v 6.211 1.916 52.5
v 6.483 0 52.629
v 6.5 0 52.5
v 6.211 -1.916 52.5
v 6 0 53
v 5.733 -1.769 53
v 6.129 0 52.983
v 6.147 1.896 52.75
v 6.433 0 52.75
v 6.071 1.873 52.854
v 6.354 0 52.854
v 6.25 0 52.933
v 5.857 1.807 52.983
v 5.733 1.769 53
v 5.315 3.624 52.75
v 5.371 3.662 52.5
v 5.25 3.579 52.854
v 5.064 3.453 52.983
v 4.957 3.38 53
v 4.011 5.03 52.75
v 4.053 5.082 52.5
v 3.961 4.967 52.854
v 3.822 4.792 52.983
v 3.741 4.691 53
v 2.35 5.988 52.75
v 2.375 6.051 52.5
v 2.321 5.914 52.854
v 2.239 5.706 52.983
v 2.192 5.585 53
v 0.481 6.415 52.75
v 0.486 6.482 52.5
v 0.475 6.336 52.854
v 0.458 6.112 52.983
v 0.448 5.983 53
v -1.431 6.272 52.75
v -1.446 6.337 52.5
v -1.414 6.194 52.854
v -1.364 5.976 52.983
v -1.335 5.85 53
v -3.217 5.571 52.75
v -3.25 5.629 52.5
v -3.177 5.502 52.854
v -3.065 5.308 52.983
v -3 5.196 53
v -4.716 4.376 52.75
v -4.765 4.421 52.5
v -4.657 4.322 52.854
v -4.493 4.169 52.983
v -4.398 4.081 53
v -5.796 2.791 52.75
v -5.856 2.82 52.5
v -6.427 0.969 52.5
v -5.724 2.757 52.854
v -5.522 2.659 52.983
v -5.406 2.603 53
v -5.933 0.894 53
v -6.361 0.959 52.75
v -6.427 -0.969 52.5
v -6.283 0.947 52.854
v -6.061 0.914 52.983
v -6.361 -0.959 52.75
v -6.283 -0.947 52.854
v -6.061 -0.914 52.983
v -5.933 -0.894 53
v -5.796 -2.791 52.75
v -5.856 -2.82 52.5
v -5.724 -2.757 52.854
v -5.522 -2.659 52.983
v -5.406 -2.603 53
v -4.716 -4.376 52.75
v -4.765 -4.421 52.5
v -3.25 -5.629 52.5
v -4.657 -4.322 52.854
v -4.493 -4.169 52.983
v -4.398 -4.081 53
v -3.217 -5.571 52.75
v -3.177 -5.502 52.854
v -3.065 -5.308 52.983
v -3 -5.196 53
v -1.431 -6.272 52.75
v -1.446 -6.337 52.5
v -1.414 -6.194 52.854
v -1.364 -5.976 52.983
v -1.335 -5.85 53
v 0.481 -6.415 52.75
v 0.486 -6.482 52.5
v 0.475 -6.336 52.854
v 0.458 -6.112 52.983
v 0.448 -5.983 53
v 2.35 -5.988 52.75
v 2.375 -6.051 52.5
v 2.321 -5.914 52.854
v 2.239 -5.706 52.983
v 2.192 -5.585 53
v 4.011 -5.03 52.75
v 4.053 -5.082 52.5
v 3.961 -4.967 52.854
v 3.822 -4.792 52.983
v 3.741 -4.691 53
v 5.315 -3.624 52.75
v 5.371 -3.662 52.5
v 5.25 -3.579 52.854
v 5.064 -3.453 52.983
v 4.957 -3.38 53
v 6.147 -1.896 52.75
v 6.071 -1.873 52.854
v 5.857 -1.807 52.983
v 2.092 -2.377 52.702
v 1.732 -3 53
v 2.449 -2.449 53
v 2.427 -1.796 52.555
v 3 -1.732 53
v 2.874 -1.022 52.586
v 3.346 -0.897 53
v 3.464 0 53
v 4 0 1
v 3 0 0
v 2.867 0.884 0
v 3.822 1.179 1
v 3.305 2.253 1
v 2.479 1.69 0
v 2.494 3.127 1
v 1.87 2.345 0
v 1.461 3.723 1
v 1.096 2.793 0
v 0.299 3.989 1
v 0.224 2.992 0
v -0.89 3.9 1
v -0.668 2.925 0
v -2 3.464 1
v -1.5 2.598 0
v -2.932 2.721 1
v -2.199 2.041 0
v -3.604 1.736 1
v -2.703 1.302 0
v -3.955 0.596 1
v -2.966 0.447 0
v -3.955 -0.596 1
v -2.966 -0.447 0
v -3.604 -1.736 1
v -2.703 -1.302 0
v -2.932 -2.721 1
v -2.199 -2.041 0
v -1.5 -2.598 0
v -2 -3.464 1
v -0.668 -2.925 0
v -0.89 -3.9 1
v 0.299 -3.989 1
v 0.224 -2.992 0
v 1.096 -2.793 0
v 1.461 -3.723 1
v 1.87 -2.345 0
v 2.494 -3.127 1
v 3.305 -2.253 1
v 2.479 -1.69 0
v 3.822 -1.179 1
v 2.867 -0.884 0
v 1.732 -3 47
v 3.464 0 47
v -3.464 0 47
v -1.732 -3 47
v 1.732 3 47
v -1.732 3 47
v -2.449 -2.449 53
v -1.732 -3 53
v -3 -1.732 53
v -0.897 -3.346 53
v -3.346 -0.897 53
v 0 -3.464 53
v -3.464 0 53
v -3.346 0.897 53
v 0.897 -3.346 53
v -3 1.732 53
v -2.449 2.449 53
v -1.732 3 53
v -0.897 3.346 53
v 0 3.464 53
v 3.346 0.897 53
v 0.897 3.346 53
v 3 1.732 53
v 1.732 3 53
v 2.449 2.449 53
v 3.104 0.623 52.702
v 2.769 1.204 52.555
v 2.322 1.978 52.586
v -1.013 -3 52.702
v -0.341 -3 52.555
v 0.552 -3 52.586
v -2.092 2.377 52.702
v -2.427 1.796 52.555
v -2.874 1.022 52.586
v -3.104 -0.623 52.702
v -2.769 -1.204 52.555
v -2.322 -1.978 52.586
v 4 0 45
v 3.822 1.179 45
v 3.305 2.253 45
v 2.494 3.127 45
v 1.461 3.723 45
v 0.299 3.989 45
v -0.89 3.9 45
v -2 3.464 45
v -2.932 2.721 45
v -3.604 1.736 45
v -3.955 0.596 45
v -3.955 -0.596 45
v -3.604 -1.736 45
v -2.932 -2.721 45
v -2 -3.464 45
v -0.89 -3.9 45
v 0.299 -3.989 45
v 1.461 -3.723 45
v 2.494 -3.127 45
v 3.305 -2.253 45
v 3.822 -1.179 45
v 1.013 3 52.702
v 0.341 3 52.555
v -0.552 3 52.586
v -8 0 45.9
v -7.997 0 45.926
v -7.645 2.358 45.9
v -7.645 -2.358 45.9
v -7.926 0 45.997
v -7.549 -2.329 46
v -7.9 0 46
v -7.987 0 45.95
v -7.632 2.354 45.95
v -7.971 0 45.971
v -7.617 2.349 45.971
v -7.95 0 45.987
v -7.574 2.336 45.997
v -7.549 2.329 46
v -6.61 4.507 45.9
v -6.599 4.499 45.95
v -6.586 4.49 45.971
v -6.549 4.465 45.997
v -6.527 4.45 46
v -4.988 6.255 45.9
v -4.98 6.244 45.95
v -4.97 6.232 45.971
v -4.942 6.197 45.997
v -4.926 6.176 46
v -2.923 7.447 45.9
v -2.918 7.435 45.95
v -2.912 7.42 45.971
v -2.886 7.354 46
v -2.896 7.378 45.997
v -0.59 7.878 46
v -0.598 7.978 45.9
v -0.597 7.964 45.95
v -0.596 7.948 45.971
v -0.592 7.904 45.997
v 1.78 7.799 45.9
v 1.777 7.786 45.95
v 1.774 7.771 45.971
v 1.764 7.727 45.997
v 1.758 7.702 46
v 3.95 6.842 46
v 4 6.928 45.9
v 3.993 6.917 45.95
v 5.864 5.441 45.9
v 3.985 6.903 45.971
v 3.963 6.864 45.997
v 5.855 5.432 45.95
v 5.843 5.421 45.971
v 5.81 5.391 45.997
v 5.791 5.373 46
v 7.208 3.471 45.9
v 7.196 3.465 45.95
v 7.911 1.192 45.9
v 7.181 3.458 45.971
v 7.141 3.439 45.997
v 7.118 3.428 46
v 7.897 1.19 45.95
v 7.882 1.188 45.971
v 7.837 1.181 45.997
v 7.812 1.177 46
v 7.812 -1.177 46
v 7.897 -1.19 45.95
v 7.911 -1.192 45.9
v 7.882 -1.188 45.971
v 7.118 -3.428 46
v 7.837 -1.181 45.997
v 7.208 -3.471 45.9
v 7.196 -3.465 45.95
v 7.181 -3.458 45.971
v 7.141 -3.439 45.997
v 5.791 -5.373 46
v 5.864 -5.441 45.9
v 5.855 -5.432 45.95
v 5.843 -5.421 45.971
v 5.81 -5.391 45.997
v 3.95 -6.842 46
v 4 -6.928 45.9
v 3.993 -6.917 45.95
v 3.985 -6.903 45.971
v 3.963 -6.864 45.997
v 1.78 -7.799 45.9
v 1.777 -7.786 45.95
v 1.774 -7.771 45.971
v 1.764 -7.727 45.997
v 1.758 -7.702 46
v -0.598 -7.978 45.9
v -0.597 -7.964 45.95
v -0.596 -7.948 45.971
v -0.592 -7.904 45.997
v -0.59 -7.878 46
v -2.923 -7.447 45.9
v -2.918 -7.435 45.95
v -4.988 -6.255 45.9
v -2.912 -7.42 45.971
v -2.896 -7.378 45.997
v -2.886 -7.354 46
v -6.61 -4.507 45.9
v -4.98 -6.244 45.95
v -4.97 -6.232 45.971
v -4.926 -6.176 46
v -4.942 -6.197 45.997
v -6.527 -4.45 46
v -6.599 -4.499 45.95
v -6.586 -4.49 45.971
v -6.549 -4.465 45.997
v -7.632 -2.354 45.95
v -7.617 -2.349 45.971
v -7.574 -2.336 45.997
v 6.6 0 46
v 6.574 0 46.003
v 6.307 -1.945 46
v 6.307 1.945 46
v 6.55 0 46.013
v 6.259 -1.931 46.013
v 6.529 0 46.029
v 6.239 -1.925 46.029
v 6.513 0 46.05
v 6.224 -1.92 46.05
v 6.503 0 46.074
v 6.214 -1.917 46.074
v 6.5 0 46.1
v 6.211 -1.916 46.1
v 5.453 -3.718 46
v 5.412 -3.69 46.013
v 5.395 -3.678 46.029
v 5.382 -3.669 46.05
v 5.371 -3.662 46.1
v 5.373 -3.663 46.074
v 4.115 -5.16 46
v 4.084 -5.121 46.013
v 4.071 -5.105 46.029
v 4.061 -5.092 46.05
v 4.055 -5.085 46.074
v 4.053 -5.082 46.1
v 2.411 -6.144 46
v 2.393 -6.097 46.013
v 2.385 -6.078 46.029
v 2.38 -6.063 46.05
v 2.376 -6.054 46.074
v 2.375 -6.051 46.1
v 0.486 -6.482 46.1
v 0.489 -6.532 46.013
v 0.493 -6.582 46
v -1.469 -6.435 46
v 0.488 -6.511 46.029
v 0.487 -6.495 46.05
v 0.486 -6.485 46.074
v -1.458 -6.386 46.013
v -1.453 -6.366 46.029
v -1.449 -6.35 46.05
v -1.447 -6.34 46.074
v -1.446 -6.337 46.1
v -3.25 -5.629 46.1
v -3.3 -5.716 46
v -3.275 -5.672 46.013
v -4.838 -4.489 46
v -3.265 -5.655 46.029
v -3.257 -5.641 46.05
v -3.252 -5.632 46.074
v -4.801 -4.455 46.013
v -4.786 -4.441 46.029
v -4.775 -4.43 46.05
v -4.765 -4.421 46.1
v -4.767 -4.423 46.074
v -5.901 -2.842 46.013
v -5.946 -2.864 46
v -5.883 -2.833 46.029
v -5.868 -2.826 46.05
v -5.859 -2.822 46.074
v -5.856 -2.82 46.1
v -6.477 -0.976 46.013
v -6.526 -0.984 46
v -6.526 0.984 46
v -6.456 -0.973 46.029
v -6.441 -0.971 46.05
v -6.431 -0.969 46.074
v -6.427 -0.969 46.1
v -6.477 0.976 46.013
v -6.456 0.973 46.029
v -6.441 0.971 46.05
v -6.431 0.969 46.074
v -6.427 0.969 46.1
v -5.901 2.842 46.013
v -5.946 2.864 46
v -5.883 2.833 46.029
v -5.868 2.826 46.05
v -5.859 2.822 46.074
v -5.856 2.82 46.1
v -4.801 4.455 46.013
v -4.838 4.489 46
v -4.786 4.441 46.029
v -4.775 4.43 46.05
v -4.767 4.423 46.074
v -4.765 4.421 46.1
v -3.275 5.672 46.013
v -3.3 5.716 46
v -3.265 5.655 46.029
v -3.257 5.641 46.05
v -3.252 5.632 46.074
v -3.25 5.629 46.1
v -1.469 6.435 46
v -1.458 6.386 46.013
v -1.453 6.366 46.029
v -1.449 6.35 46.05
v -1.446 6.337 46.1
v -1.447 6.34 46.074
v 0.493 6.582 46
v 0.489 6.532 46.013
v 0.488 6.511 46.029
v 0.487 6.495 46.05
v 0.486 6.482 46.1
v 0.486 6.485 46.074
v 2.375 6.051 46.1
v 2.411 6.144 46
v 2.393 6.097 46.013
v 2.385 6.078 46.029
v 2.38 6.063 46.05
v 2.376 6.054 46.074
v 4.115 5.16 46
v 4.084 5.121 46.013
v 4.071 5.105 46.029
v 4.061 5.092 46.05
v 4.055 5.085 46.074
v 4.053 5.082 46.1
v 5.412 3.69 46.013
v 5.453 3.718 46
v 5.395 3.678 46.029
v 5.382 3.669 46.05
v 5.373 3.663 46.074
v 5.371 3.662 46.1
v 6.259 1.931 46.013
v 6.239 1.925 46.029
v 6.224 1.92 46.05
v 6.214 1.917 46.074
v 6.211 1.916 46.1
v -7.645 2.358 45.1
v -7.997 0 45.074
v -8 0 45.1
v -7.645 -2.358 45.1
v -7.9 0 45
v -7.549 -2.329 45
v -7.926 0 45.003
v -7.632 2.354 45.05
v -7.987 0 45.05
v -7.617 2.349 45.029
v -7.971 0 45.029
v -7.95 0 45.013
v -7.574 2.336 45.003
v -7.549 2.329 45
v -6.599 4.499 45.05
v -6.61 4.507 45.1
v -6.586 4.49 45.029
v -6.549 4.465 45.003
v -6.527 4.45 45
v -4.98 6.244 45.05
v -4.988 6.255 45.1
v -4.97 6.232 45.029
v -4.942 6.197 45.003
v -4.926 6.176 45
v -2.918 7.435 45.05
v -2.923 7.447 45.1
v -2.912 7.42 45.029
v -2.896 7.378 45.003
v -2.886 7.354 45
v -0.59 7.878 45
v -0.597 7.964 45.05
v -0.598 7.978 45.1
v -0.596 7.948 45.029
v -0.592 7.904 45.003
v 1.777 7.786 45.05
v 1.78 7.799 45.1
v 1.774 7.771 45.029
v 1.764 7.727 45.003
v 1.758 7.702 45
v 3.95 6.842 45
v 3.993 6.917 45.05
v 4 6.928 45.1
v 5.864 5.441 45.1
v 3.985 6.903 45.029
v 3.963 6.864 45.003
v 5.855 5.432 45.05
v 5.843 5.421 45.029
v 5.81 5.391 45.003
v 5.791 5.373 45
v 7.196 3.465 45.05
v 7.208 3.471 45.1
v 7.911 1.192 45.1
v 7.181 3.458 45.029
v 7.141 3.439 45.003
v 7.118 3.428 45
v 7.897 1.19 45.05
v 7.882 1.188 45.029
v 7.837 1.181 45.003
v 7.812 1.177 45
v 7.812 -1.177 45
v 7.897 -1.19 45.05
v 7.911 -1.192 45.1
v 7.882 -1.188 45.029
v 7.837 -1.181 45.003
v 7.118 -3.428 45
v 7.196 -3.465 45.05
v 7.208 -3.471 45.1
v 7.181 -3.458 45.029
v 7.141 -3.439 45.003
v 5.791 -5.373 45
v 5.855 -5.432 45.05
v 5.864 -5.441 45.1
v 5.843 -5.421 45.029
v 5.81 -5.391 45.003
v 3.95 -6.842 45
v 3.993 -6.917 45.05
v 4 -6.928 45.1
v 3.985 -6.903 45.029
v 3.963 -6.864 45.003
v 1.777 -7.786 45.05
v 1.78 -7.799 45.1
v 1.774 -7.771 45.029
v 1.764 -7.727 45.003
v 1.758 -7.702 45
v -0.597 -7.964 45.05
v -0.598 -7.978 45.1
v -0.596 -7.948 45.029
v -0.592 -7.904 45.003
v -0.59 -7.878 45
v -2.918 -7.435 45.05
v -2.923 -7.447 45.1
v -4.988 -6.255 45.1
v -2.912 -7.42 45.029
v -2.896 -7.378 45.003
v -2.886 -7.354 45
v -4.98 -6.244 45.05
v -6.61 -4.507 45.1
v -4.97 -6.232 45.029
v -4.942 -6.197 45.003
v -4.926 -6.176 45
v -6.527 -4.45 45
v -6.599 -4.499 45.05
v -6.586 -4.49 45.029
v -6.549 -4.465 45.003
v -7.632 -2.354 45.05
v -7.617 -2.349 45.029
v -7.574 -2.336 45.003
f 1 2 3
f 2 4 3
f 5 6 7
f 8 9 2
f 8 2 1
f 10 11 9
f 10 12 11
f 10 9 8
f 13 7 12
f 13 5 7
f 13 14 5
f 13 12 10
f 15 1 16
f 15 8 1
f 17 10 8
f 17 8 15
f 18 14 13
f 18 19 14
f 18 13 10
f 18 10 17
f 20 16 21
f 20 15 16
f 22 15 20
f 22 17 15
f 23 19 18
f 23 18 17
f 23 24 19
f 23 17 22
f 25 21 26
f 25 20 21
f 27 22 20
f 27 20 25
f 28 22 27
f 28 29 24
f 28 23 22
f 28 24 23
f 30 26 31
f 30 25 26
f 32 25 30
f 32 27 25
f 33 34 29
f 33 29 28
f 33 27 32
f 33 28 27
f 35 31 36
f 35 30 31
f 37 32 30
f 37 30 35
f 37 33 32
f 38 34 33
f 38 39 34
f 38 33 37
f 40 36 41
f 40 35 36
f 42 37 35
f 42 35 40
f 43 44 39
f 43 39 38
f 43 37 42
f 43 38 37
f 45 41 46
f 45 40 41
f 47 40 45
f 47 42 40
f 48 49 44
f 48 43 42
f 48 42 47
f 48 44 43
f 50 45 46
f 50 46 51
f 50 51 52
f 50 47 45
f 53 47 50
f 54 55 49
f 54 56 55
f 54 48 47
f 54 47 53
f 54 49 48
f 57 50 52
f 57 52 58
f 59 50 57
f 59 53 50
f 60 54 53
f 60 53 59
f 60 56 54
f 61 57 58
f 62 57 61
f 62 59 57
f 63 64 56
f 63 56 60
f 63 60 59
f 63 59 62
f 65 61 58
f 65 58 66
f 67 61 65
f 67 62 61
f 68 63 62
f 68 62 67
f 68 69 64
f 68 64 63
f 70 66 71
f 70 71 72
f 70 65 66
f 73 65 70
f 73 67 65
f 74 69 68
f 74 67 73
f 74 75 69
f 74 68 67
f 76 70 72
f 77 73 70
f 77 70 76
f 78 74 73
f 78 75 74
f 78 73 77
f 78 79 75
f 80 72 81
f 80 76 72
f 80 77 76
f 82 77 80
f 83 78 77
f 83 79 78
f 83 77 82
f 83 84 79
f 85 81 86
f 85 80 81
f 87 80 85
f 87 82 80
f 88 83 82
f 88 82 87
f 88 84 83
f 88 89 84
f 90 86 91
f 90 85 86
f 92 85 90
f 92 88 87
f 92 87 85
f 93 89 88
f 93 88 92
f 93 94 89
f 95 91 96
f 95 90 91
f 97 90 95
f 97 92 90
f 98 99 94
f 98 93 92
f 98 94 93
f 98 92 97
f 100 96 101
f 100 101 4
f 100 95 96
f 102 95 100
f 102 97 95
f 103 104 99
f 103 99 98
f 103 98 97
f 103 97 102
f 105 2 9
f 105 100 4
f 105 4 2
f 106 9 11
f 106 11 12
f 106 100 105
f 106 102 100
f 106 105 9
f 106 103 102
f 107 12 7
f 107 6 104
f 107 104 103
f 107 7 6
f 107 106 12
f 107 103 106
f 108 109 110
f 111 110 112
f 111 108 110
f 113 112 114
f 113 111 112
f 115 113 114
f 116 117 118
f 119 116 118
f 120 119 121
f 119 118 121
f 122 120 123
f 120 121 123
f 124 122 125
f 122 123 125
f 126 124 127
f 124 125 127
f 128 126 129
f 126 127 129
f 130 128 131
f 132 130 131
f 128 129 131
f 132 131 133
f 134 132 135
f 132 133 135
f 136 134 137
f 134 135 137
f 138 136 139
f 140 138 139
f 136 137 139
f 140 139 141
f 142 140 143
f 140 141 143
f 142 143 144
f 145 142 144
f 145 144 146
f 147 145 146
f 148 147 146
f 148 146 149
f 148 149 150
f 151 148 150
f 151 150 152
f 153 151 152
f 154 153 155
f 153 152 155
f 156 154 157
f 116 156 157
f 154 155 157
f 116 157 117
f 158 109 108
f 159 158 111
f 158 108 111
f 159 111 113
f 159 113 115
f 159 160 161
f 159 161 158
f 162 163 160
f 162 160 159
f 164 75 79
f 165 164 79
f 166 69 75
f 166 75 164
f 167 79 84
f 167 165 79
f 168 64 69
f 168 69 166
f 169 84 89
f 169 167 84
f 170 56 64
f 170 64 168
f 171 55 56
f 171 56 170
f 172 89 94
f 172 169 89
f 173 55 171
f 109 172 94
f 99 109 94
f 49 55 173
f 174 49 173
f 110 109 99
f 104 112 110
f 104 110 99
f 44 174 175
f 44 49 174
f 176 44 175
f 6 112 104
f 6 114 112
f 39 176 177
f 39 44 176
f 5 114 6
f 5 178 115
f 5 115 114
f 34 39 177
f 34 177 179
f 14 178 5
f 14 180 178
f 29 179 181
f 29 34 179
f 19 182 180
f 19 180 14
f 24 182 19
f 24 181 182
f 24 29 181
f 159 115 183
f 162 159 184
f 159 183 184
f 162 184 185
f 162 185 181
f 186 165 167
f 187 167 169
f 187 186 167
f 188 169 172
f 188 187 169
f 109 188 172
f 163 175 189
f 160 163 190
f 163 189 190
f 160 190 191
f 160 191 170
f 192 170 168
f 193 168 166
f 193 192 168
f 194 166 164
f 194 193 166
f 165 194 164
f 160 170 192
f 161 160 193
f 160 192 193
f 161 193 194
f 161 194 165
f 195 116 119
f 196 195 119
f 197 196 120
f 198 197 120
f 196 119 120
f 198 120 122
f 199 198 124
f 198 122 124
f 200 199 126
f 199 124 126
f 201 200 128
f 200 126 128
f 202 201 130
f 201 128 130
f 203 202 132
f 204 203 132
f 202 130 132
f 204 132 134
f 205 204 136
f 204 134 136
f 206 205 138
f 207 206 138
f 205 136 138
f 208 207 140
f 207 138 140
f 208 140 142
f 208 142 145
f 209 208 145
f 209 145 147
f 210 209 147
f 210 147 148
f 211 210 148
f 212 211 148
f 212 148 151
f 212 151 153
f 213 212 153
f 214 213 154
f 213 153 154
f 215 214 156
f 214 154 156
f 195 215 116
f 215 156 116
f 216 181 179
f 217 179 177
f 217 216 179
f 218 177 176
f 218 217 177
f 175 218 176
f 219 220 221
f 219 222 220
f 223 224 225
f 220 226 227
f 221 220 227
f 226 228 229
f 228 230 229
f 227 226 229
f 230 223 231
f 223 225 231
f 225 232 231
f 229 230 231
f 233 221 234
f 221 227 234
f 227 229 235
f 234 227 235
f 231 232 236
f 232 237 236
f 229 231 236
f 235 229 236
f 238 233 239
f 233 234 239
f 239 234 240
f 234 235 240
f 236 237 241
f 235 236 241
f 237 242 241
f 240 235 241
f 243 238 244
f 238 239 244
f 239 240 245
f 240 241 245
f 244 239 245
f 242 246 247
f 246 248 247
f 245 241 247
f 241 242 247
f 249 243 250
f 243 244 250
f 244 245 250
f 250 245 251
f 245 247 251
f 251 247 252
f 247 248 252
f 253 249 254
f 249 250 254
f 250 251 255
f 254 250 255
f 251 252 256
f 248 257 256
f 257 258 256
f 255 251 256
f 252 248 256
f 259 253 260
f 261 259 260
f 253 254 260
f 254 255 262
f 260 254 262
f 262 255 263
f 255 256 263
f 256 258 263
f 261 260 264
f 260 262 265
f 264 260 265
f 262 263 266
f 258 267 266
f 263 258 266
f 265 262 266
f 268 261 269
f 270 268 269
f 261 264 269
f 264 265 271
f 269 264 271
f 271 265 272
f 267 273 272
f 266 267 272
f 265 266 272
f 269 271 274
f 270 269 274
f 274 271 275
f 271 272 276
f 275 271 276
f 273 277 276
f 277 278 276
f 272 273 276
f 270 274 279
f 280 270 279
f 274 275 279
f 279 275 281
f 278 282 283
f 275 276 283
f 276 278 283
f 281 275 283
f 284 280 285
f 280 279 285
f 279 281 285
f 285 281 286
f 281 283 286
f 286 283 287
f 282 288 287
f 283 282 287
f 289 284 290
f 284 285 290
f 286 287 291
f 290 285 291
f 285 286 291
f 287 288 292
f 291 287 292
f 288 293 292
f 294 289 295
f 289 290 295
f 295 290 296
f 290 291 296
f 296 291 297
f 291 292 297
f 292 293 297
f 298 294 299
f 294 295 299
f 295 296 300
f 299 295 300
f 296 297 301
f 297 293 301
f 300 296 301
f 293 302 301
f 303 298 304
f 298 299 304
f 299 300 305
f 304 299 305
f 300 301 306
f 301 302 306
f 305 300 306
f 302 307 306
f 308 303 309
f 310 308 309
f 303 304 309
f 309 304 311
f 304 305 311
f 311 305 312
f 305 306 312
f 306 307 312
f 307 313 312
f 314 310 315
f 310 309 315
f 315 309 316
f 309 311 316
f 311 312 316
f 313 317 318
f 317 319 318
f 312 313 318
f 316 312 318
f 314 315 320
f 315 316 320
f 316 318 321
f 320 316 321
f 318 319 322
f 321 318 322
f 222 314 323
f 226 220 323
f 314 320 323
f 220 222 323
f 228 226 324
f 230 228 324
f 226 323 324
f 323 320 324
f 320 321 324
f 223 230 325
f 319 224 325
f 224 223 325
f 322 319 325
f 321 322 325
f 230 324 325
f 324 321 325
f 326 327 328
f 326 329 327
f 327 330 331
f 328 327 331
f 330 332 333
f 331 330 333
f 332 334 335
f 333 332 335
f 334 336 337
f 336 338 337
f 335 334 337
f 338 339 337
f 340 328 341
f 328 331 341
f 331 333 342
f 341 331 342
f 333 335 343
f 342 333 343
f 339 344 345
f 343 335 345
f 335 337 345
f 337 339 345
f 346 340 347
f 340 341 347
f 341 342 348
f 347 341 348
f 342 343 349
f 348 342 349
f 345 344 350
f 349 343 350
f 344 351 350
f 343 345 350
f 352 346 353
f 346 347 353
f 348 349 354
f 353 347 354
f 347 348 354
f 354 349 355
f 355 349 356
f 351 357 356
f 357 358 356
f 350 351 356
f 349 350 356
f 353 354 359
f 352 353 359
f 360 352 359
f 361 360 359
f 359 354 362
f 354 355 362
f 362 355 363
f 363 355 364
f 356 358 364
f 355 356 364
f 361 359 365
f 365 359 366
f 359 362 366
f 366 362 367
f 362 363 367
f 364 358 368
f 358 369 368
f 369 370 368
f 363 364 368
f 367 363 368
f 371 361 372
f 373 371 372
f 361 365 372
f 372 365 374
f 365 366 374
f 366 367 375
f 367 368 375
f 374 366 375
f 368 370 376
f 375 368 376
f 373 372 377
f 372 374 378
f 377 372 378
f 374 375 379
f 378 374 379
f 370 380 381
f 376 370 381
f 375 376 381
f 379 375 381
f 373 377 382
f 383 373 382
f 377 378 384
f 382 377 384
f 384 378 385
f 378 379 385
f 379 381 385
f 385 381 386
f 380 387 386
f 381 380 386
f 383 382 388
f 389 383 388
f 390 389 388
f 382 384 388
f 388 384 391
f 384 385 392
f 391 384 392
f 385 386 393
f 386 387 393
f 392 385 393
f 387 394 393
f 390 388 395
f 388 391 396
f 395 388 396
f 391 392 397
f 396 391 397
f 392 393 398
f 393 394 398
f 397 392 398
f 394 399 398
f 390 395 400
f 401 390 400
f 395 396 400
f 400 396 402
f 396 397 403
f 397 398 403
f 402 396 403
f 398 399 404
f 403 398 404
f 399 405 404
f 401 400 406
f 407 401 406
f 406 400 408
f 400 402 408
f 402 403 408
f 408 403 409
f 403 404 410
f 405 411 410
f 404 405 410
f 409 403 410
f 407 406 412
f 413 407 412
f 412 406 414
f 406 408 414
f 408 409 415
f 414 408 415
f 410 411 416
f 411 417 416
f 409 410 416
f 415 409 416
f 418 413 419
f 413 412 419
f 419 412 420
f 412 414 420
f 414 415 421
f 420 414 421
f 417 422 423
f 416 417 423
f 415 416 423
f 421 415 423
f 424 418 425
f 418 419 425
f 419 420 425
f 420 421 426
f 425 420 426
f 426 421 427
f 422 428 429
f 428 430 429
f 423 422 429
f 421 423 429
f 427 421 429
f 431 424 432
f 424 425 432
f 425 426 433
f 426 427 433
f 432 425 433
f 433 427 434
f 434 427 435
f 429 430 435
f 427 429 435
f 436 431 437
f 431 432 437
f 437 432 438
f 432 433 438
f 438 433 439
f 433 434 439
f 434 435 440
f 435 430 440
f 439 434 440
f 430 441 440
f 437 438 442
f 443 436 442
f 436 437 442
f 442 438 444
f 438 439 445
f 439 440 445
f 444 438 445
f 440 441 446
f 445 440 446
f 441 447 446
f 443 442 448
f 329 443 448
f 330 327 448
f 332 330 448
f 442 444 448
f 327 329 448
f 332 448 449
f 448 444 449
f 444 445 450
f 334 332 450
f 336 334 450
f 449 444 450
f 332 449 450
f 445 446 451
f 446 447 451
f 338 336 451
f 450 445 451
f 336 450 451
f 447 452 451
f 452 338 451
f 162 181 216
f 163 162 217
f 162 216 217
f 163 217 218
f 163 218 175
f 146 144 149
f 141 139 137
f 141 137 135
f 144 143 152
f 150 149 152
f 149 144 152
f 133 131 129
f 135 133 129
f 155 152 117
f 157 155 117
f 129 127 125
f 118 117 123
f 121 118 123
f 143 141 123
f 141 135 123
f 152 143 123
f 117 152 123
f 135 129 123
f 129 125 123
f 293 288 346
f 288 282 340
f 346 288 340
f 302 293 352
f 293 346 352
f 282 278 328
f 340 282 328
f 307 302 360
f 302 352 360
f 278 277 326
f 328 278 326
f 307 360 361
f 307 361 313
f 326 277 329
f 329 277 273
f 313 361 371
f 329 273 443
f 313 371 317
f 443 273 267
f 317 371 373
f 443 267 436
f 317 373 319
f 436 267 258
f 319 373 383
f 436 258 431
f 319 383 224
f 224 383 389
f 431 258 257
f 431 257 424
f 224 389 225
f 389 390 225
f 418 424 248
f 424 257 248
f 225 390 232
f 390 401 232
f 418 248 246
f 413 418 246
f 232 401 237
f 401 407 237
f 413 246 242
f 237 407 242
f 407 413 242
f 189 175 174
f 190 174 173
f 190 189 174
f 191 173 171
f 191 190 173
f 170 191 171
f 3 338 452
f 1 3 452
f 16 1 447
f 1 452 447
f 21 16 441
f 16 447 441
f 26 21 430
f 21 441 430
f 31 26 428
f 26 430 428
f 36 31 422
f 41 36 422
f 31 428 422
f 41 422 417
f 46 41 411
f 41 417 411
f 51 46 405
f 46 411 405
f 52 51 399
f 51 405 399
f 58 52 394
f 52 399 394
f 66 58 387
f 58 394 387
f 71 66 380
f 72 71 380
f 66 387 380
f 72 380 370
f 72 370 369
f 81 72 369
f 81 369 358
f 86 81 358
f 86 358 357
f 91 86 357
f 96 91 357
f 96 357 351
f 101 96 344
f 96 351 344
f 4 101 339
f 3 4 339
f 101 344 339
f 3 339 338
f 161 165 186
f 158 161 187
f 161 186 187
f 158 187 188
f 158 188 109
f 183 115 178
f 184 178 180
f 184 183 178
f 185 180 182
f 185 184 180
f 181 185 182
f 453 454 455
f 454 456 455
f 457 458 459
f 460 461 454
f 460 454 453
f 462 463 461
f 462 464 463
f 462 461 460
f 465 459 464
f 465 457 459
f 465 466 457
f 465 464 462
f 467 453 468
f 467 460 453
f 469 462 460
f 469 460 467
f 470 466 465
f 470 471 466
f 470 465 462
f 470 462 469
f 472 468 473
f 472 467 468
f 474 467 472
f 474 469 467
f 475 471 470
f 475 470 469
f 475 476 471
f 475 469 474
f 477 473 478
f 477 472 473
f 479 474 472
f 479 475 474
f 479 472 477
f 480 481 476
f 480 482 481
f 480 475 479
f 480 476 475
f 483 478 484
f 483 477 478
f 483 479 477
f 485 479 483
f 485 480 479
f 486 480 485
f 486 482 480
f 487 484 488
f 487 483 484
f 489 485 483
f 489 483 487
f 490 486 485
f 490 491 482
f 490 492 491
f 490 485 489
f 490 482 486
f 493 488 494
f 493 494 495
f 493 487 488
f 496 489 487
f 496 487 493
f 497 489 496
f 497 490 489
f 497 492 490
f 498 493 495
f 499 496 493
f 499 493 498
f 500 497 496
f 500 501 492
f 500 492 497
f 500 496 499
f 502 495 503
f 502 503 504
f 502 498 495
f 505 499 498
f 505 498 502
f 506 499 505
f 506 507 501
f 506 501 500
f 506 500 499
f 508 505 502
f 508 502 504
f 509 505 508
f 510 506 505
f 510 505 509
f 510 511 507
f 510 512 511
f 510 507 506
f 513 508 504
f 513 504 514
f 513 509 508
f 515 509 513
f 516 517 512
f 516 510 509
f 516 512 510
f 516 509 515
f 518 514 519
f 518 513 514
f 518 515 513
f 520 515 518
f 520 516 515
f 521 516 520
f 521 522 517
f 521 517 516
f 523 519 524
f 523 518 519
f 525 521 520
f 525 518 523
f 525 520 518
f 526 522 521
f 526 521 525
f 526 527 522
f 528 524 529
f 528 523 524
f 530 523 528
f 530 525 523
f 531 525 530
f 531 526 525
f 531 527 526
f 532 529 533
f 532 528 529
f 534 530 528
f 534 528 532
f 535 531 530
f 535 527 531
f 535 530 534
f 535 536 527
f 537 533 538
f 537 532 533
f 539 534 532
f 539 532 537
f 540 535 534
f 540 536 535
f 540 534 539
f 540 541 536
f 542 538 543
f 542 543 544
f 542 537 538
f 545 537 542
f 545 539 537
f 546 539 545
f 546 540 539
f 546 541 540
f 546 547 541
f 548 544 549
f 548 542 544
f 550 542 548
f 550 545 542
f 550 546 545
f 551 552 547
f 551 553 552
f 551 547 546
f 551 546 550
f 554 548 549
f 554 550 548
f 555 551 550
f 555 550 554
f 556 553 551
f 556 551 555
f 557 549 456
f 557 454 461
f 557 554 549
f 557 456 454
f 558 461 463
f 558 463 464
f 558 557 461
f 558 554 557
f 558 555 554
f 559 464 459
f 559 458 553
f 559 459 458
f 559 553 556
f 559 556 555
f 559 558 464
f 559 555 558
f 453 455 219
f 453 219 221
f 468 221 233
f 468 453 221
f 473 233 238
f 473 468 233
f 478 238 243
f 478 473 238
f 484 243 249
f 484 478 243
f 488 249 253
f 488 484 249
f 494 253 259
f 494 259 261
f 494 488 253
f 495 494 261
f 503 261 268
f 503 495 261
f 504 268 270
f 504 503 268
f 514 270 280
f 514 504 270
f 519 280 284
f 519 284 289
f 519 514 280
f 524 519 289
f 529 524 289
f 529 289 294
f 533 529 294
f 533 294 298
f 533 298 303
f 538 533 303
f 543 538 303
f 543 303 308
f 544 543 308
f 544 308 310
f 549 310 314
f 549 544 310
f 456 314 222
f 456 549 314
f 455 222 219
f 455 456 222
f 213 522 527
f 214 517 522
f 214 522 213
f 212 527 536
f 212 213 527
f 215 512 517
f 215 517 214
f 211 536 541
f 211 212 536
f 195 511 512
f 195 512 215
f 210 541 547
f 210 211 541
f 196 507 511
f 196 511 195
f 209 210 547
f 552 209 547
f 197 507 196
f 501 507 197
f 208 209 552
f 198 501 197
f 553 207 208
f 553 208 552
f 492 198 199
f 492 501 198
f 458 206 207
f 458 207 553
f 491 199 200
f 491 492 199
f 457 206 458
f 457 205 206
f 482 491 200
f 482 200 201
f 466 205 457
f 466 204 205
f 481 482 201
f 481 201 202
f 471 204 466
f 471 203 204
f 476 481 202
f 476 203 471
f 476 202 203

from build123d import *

# Parameters (mm, degrees)
SCHIZZO1_R                   = 4
ESTRUSIONE_ESTRUSIONE1_DEPTH = 45
SMUSSO1_SIZE                 = 1
SCHIZZO6_R                   = 6.5
ESTRUSIONE_ESTRUSIONE3_DEPTH = 8
TAGLIO_ESTRUSIONE3_DEPTH     = 6
SCHIZZO8_R                   = 3.464101615
TAGLIO_ESTRUSIONE4_DEPTH     = 1
TAGLIO_ESTRUSIONE4_TAPER     = 45
RACCORDO1_R                  = 0.5
SCHIZZO9_R                   = 8
SCHIZZO9_R_2                 = 6.5
ESTRUSIONE_ESTRUSIONE4_DEPTH = 1
RACCORDO2_R                  = 0.1


with BuildPart() as part:
    # Schizzo1 → Estrusione-Estrusione1 (new body)
    with BuildSketch(Plane.XY):
        Circle(SCHIZZO1_R)
    extrude(amount=ESTRUSIONE_ESTRUSIONE1_DEPTH)

    # Smusso1
    smusso1_edges = [part.edges().sort_by_distance(p)[0] for p in [
        (-4, 0, 0),
    ]]
    chamfer(smusso1_edges, length=SMUSSO1_SIZE)

    # Schizzo6 → Estrusione-Estrusione3 (add)
    with BuildSketch(Plane.XY.offset(45)):
        Circle(SCHIZZO6_R)
    extrude(amount=ESTRUSIONE_ESTRUSIONE3_DEPTH)

    # Schizzo7 → Taglio-Estrusione3 (cut)
    with BuildSketch(Plane.XY.offset(53)):
        Polygon((1.732050808, 3), (-1.732050808, 3), (-3.464101615, 0), (-1.732050808, -3), (1.732050808, -3), (3.464101615, 0), align=None)
    extrude(amount=-TAGLIO_ESTRUSIONE3_DEPTH, mode=Mode.SUBTRACT)

    # Schizzo8 → Taglio-Estrusione4 (cut)
    with BuildSketch(Plane.XY.offset(53)):
        Circle(SCHIZZO8_R)
    extrude(amount=-TAGLIO_ESTRUSIONE4_DEPTH, taper=TAGLIO_ESTRUSIONE4_TAPER, mode=Mode.SUBTRACT)

    # Raccordo1
    raccordo1_edges = [part.edges().sort_by_distance(p)[0] for p in [
        (-6.5, 0, 53),
    ]]
    fillet(raccordo1_edges, radius=RACCORDO1_R)

    # Schizzo9 → Estrusione-Estrusione4 (add)
    with BuildSketch(Plane(origin=(0, 0, 45), x_dir=(-1, 0, 0), z_dir=(0, 0, -1))):
        Circle(SCHIZZO9_R)
        Circle(SCHIZZO9_R_2, mode=Mode.SUBTRACT)
    extrude(amount=-ESTRUSIONE_ESTRUSIONE4_DEPTH)

    # Raccordo2
    raccordo2_edges = [part.edges().sort_by_distance(p)[0] for p in [
        (-6.5, 0, 46),
        (8, 0, 46),
        (8, 0, 45),
    ]]
    fillet(raccordo2_edges, radius=RACCORDO2_R)


solid = part.part
